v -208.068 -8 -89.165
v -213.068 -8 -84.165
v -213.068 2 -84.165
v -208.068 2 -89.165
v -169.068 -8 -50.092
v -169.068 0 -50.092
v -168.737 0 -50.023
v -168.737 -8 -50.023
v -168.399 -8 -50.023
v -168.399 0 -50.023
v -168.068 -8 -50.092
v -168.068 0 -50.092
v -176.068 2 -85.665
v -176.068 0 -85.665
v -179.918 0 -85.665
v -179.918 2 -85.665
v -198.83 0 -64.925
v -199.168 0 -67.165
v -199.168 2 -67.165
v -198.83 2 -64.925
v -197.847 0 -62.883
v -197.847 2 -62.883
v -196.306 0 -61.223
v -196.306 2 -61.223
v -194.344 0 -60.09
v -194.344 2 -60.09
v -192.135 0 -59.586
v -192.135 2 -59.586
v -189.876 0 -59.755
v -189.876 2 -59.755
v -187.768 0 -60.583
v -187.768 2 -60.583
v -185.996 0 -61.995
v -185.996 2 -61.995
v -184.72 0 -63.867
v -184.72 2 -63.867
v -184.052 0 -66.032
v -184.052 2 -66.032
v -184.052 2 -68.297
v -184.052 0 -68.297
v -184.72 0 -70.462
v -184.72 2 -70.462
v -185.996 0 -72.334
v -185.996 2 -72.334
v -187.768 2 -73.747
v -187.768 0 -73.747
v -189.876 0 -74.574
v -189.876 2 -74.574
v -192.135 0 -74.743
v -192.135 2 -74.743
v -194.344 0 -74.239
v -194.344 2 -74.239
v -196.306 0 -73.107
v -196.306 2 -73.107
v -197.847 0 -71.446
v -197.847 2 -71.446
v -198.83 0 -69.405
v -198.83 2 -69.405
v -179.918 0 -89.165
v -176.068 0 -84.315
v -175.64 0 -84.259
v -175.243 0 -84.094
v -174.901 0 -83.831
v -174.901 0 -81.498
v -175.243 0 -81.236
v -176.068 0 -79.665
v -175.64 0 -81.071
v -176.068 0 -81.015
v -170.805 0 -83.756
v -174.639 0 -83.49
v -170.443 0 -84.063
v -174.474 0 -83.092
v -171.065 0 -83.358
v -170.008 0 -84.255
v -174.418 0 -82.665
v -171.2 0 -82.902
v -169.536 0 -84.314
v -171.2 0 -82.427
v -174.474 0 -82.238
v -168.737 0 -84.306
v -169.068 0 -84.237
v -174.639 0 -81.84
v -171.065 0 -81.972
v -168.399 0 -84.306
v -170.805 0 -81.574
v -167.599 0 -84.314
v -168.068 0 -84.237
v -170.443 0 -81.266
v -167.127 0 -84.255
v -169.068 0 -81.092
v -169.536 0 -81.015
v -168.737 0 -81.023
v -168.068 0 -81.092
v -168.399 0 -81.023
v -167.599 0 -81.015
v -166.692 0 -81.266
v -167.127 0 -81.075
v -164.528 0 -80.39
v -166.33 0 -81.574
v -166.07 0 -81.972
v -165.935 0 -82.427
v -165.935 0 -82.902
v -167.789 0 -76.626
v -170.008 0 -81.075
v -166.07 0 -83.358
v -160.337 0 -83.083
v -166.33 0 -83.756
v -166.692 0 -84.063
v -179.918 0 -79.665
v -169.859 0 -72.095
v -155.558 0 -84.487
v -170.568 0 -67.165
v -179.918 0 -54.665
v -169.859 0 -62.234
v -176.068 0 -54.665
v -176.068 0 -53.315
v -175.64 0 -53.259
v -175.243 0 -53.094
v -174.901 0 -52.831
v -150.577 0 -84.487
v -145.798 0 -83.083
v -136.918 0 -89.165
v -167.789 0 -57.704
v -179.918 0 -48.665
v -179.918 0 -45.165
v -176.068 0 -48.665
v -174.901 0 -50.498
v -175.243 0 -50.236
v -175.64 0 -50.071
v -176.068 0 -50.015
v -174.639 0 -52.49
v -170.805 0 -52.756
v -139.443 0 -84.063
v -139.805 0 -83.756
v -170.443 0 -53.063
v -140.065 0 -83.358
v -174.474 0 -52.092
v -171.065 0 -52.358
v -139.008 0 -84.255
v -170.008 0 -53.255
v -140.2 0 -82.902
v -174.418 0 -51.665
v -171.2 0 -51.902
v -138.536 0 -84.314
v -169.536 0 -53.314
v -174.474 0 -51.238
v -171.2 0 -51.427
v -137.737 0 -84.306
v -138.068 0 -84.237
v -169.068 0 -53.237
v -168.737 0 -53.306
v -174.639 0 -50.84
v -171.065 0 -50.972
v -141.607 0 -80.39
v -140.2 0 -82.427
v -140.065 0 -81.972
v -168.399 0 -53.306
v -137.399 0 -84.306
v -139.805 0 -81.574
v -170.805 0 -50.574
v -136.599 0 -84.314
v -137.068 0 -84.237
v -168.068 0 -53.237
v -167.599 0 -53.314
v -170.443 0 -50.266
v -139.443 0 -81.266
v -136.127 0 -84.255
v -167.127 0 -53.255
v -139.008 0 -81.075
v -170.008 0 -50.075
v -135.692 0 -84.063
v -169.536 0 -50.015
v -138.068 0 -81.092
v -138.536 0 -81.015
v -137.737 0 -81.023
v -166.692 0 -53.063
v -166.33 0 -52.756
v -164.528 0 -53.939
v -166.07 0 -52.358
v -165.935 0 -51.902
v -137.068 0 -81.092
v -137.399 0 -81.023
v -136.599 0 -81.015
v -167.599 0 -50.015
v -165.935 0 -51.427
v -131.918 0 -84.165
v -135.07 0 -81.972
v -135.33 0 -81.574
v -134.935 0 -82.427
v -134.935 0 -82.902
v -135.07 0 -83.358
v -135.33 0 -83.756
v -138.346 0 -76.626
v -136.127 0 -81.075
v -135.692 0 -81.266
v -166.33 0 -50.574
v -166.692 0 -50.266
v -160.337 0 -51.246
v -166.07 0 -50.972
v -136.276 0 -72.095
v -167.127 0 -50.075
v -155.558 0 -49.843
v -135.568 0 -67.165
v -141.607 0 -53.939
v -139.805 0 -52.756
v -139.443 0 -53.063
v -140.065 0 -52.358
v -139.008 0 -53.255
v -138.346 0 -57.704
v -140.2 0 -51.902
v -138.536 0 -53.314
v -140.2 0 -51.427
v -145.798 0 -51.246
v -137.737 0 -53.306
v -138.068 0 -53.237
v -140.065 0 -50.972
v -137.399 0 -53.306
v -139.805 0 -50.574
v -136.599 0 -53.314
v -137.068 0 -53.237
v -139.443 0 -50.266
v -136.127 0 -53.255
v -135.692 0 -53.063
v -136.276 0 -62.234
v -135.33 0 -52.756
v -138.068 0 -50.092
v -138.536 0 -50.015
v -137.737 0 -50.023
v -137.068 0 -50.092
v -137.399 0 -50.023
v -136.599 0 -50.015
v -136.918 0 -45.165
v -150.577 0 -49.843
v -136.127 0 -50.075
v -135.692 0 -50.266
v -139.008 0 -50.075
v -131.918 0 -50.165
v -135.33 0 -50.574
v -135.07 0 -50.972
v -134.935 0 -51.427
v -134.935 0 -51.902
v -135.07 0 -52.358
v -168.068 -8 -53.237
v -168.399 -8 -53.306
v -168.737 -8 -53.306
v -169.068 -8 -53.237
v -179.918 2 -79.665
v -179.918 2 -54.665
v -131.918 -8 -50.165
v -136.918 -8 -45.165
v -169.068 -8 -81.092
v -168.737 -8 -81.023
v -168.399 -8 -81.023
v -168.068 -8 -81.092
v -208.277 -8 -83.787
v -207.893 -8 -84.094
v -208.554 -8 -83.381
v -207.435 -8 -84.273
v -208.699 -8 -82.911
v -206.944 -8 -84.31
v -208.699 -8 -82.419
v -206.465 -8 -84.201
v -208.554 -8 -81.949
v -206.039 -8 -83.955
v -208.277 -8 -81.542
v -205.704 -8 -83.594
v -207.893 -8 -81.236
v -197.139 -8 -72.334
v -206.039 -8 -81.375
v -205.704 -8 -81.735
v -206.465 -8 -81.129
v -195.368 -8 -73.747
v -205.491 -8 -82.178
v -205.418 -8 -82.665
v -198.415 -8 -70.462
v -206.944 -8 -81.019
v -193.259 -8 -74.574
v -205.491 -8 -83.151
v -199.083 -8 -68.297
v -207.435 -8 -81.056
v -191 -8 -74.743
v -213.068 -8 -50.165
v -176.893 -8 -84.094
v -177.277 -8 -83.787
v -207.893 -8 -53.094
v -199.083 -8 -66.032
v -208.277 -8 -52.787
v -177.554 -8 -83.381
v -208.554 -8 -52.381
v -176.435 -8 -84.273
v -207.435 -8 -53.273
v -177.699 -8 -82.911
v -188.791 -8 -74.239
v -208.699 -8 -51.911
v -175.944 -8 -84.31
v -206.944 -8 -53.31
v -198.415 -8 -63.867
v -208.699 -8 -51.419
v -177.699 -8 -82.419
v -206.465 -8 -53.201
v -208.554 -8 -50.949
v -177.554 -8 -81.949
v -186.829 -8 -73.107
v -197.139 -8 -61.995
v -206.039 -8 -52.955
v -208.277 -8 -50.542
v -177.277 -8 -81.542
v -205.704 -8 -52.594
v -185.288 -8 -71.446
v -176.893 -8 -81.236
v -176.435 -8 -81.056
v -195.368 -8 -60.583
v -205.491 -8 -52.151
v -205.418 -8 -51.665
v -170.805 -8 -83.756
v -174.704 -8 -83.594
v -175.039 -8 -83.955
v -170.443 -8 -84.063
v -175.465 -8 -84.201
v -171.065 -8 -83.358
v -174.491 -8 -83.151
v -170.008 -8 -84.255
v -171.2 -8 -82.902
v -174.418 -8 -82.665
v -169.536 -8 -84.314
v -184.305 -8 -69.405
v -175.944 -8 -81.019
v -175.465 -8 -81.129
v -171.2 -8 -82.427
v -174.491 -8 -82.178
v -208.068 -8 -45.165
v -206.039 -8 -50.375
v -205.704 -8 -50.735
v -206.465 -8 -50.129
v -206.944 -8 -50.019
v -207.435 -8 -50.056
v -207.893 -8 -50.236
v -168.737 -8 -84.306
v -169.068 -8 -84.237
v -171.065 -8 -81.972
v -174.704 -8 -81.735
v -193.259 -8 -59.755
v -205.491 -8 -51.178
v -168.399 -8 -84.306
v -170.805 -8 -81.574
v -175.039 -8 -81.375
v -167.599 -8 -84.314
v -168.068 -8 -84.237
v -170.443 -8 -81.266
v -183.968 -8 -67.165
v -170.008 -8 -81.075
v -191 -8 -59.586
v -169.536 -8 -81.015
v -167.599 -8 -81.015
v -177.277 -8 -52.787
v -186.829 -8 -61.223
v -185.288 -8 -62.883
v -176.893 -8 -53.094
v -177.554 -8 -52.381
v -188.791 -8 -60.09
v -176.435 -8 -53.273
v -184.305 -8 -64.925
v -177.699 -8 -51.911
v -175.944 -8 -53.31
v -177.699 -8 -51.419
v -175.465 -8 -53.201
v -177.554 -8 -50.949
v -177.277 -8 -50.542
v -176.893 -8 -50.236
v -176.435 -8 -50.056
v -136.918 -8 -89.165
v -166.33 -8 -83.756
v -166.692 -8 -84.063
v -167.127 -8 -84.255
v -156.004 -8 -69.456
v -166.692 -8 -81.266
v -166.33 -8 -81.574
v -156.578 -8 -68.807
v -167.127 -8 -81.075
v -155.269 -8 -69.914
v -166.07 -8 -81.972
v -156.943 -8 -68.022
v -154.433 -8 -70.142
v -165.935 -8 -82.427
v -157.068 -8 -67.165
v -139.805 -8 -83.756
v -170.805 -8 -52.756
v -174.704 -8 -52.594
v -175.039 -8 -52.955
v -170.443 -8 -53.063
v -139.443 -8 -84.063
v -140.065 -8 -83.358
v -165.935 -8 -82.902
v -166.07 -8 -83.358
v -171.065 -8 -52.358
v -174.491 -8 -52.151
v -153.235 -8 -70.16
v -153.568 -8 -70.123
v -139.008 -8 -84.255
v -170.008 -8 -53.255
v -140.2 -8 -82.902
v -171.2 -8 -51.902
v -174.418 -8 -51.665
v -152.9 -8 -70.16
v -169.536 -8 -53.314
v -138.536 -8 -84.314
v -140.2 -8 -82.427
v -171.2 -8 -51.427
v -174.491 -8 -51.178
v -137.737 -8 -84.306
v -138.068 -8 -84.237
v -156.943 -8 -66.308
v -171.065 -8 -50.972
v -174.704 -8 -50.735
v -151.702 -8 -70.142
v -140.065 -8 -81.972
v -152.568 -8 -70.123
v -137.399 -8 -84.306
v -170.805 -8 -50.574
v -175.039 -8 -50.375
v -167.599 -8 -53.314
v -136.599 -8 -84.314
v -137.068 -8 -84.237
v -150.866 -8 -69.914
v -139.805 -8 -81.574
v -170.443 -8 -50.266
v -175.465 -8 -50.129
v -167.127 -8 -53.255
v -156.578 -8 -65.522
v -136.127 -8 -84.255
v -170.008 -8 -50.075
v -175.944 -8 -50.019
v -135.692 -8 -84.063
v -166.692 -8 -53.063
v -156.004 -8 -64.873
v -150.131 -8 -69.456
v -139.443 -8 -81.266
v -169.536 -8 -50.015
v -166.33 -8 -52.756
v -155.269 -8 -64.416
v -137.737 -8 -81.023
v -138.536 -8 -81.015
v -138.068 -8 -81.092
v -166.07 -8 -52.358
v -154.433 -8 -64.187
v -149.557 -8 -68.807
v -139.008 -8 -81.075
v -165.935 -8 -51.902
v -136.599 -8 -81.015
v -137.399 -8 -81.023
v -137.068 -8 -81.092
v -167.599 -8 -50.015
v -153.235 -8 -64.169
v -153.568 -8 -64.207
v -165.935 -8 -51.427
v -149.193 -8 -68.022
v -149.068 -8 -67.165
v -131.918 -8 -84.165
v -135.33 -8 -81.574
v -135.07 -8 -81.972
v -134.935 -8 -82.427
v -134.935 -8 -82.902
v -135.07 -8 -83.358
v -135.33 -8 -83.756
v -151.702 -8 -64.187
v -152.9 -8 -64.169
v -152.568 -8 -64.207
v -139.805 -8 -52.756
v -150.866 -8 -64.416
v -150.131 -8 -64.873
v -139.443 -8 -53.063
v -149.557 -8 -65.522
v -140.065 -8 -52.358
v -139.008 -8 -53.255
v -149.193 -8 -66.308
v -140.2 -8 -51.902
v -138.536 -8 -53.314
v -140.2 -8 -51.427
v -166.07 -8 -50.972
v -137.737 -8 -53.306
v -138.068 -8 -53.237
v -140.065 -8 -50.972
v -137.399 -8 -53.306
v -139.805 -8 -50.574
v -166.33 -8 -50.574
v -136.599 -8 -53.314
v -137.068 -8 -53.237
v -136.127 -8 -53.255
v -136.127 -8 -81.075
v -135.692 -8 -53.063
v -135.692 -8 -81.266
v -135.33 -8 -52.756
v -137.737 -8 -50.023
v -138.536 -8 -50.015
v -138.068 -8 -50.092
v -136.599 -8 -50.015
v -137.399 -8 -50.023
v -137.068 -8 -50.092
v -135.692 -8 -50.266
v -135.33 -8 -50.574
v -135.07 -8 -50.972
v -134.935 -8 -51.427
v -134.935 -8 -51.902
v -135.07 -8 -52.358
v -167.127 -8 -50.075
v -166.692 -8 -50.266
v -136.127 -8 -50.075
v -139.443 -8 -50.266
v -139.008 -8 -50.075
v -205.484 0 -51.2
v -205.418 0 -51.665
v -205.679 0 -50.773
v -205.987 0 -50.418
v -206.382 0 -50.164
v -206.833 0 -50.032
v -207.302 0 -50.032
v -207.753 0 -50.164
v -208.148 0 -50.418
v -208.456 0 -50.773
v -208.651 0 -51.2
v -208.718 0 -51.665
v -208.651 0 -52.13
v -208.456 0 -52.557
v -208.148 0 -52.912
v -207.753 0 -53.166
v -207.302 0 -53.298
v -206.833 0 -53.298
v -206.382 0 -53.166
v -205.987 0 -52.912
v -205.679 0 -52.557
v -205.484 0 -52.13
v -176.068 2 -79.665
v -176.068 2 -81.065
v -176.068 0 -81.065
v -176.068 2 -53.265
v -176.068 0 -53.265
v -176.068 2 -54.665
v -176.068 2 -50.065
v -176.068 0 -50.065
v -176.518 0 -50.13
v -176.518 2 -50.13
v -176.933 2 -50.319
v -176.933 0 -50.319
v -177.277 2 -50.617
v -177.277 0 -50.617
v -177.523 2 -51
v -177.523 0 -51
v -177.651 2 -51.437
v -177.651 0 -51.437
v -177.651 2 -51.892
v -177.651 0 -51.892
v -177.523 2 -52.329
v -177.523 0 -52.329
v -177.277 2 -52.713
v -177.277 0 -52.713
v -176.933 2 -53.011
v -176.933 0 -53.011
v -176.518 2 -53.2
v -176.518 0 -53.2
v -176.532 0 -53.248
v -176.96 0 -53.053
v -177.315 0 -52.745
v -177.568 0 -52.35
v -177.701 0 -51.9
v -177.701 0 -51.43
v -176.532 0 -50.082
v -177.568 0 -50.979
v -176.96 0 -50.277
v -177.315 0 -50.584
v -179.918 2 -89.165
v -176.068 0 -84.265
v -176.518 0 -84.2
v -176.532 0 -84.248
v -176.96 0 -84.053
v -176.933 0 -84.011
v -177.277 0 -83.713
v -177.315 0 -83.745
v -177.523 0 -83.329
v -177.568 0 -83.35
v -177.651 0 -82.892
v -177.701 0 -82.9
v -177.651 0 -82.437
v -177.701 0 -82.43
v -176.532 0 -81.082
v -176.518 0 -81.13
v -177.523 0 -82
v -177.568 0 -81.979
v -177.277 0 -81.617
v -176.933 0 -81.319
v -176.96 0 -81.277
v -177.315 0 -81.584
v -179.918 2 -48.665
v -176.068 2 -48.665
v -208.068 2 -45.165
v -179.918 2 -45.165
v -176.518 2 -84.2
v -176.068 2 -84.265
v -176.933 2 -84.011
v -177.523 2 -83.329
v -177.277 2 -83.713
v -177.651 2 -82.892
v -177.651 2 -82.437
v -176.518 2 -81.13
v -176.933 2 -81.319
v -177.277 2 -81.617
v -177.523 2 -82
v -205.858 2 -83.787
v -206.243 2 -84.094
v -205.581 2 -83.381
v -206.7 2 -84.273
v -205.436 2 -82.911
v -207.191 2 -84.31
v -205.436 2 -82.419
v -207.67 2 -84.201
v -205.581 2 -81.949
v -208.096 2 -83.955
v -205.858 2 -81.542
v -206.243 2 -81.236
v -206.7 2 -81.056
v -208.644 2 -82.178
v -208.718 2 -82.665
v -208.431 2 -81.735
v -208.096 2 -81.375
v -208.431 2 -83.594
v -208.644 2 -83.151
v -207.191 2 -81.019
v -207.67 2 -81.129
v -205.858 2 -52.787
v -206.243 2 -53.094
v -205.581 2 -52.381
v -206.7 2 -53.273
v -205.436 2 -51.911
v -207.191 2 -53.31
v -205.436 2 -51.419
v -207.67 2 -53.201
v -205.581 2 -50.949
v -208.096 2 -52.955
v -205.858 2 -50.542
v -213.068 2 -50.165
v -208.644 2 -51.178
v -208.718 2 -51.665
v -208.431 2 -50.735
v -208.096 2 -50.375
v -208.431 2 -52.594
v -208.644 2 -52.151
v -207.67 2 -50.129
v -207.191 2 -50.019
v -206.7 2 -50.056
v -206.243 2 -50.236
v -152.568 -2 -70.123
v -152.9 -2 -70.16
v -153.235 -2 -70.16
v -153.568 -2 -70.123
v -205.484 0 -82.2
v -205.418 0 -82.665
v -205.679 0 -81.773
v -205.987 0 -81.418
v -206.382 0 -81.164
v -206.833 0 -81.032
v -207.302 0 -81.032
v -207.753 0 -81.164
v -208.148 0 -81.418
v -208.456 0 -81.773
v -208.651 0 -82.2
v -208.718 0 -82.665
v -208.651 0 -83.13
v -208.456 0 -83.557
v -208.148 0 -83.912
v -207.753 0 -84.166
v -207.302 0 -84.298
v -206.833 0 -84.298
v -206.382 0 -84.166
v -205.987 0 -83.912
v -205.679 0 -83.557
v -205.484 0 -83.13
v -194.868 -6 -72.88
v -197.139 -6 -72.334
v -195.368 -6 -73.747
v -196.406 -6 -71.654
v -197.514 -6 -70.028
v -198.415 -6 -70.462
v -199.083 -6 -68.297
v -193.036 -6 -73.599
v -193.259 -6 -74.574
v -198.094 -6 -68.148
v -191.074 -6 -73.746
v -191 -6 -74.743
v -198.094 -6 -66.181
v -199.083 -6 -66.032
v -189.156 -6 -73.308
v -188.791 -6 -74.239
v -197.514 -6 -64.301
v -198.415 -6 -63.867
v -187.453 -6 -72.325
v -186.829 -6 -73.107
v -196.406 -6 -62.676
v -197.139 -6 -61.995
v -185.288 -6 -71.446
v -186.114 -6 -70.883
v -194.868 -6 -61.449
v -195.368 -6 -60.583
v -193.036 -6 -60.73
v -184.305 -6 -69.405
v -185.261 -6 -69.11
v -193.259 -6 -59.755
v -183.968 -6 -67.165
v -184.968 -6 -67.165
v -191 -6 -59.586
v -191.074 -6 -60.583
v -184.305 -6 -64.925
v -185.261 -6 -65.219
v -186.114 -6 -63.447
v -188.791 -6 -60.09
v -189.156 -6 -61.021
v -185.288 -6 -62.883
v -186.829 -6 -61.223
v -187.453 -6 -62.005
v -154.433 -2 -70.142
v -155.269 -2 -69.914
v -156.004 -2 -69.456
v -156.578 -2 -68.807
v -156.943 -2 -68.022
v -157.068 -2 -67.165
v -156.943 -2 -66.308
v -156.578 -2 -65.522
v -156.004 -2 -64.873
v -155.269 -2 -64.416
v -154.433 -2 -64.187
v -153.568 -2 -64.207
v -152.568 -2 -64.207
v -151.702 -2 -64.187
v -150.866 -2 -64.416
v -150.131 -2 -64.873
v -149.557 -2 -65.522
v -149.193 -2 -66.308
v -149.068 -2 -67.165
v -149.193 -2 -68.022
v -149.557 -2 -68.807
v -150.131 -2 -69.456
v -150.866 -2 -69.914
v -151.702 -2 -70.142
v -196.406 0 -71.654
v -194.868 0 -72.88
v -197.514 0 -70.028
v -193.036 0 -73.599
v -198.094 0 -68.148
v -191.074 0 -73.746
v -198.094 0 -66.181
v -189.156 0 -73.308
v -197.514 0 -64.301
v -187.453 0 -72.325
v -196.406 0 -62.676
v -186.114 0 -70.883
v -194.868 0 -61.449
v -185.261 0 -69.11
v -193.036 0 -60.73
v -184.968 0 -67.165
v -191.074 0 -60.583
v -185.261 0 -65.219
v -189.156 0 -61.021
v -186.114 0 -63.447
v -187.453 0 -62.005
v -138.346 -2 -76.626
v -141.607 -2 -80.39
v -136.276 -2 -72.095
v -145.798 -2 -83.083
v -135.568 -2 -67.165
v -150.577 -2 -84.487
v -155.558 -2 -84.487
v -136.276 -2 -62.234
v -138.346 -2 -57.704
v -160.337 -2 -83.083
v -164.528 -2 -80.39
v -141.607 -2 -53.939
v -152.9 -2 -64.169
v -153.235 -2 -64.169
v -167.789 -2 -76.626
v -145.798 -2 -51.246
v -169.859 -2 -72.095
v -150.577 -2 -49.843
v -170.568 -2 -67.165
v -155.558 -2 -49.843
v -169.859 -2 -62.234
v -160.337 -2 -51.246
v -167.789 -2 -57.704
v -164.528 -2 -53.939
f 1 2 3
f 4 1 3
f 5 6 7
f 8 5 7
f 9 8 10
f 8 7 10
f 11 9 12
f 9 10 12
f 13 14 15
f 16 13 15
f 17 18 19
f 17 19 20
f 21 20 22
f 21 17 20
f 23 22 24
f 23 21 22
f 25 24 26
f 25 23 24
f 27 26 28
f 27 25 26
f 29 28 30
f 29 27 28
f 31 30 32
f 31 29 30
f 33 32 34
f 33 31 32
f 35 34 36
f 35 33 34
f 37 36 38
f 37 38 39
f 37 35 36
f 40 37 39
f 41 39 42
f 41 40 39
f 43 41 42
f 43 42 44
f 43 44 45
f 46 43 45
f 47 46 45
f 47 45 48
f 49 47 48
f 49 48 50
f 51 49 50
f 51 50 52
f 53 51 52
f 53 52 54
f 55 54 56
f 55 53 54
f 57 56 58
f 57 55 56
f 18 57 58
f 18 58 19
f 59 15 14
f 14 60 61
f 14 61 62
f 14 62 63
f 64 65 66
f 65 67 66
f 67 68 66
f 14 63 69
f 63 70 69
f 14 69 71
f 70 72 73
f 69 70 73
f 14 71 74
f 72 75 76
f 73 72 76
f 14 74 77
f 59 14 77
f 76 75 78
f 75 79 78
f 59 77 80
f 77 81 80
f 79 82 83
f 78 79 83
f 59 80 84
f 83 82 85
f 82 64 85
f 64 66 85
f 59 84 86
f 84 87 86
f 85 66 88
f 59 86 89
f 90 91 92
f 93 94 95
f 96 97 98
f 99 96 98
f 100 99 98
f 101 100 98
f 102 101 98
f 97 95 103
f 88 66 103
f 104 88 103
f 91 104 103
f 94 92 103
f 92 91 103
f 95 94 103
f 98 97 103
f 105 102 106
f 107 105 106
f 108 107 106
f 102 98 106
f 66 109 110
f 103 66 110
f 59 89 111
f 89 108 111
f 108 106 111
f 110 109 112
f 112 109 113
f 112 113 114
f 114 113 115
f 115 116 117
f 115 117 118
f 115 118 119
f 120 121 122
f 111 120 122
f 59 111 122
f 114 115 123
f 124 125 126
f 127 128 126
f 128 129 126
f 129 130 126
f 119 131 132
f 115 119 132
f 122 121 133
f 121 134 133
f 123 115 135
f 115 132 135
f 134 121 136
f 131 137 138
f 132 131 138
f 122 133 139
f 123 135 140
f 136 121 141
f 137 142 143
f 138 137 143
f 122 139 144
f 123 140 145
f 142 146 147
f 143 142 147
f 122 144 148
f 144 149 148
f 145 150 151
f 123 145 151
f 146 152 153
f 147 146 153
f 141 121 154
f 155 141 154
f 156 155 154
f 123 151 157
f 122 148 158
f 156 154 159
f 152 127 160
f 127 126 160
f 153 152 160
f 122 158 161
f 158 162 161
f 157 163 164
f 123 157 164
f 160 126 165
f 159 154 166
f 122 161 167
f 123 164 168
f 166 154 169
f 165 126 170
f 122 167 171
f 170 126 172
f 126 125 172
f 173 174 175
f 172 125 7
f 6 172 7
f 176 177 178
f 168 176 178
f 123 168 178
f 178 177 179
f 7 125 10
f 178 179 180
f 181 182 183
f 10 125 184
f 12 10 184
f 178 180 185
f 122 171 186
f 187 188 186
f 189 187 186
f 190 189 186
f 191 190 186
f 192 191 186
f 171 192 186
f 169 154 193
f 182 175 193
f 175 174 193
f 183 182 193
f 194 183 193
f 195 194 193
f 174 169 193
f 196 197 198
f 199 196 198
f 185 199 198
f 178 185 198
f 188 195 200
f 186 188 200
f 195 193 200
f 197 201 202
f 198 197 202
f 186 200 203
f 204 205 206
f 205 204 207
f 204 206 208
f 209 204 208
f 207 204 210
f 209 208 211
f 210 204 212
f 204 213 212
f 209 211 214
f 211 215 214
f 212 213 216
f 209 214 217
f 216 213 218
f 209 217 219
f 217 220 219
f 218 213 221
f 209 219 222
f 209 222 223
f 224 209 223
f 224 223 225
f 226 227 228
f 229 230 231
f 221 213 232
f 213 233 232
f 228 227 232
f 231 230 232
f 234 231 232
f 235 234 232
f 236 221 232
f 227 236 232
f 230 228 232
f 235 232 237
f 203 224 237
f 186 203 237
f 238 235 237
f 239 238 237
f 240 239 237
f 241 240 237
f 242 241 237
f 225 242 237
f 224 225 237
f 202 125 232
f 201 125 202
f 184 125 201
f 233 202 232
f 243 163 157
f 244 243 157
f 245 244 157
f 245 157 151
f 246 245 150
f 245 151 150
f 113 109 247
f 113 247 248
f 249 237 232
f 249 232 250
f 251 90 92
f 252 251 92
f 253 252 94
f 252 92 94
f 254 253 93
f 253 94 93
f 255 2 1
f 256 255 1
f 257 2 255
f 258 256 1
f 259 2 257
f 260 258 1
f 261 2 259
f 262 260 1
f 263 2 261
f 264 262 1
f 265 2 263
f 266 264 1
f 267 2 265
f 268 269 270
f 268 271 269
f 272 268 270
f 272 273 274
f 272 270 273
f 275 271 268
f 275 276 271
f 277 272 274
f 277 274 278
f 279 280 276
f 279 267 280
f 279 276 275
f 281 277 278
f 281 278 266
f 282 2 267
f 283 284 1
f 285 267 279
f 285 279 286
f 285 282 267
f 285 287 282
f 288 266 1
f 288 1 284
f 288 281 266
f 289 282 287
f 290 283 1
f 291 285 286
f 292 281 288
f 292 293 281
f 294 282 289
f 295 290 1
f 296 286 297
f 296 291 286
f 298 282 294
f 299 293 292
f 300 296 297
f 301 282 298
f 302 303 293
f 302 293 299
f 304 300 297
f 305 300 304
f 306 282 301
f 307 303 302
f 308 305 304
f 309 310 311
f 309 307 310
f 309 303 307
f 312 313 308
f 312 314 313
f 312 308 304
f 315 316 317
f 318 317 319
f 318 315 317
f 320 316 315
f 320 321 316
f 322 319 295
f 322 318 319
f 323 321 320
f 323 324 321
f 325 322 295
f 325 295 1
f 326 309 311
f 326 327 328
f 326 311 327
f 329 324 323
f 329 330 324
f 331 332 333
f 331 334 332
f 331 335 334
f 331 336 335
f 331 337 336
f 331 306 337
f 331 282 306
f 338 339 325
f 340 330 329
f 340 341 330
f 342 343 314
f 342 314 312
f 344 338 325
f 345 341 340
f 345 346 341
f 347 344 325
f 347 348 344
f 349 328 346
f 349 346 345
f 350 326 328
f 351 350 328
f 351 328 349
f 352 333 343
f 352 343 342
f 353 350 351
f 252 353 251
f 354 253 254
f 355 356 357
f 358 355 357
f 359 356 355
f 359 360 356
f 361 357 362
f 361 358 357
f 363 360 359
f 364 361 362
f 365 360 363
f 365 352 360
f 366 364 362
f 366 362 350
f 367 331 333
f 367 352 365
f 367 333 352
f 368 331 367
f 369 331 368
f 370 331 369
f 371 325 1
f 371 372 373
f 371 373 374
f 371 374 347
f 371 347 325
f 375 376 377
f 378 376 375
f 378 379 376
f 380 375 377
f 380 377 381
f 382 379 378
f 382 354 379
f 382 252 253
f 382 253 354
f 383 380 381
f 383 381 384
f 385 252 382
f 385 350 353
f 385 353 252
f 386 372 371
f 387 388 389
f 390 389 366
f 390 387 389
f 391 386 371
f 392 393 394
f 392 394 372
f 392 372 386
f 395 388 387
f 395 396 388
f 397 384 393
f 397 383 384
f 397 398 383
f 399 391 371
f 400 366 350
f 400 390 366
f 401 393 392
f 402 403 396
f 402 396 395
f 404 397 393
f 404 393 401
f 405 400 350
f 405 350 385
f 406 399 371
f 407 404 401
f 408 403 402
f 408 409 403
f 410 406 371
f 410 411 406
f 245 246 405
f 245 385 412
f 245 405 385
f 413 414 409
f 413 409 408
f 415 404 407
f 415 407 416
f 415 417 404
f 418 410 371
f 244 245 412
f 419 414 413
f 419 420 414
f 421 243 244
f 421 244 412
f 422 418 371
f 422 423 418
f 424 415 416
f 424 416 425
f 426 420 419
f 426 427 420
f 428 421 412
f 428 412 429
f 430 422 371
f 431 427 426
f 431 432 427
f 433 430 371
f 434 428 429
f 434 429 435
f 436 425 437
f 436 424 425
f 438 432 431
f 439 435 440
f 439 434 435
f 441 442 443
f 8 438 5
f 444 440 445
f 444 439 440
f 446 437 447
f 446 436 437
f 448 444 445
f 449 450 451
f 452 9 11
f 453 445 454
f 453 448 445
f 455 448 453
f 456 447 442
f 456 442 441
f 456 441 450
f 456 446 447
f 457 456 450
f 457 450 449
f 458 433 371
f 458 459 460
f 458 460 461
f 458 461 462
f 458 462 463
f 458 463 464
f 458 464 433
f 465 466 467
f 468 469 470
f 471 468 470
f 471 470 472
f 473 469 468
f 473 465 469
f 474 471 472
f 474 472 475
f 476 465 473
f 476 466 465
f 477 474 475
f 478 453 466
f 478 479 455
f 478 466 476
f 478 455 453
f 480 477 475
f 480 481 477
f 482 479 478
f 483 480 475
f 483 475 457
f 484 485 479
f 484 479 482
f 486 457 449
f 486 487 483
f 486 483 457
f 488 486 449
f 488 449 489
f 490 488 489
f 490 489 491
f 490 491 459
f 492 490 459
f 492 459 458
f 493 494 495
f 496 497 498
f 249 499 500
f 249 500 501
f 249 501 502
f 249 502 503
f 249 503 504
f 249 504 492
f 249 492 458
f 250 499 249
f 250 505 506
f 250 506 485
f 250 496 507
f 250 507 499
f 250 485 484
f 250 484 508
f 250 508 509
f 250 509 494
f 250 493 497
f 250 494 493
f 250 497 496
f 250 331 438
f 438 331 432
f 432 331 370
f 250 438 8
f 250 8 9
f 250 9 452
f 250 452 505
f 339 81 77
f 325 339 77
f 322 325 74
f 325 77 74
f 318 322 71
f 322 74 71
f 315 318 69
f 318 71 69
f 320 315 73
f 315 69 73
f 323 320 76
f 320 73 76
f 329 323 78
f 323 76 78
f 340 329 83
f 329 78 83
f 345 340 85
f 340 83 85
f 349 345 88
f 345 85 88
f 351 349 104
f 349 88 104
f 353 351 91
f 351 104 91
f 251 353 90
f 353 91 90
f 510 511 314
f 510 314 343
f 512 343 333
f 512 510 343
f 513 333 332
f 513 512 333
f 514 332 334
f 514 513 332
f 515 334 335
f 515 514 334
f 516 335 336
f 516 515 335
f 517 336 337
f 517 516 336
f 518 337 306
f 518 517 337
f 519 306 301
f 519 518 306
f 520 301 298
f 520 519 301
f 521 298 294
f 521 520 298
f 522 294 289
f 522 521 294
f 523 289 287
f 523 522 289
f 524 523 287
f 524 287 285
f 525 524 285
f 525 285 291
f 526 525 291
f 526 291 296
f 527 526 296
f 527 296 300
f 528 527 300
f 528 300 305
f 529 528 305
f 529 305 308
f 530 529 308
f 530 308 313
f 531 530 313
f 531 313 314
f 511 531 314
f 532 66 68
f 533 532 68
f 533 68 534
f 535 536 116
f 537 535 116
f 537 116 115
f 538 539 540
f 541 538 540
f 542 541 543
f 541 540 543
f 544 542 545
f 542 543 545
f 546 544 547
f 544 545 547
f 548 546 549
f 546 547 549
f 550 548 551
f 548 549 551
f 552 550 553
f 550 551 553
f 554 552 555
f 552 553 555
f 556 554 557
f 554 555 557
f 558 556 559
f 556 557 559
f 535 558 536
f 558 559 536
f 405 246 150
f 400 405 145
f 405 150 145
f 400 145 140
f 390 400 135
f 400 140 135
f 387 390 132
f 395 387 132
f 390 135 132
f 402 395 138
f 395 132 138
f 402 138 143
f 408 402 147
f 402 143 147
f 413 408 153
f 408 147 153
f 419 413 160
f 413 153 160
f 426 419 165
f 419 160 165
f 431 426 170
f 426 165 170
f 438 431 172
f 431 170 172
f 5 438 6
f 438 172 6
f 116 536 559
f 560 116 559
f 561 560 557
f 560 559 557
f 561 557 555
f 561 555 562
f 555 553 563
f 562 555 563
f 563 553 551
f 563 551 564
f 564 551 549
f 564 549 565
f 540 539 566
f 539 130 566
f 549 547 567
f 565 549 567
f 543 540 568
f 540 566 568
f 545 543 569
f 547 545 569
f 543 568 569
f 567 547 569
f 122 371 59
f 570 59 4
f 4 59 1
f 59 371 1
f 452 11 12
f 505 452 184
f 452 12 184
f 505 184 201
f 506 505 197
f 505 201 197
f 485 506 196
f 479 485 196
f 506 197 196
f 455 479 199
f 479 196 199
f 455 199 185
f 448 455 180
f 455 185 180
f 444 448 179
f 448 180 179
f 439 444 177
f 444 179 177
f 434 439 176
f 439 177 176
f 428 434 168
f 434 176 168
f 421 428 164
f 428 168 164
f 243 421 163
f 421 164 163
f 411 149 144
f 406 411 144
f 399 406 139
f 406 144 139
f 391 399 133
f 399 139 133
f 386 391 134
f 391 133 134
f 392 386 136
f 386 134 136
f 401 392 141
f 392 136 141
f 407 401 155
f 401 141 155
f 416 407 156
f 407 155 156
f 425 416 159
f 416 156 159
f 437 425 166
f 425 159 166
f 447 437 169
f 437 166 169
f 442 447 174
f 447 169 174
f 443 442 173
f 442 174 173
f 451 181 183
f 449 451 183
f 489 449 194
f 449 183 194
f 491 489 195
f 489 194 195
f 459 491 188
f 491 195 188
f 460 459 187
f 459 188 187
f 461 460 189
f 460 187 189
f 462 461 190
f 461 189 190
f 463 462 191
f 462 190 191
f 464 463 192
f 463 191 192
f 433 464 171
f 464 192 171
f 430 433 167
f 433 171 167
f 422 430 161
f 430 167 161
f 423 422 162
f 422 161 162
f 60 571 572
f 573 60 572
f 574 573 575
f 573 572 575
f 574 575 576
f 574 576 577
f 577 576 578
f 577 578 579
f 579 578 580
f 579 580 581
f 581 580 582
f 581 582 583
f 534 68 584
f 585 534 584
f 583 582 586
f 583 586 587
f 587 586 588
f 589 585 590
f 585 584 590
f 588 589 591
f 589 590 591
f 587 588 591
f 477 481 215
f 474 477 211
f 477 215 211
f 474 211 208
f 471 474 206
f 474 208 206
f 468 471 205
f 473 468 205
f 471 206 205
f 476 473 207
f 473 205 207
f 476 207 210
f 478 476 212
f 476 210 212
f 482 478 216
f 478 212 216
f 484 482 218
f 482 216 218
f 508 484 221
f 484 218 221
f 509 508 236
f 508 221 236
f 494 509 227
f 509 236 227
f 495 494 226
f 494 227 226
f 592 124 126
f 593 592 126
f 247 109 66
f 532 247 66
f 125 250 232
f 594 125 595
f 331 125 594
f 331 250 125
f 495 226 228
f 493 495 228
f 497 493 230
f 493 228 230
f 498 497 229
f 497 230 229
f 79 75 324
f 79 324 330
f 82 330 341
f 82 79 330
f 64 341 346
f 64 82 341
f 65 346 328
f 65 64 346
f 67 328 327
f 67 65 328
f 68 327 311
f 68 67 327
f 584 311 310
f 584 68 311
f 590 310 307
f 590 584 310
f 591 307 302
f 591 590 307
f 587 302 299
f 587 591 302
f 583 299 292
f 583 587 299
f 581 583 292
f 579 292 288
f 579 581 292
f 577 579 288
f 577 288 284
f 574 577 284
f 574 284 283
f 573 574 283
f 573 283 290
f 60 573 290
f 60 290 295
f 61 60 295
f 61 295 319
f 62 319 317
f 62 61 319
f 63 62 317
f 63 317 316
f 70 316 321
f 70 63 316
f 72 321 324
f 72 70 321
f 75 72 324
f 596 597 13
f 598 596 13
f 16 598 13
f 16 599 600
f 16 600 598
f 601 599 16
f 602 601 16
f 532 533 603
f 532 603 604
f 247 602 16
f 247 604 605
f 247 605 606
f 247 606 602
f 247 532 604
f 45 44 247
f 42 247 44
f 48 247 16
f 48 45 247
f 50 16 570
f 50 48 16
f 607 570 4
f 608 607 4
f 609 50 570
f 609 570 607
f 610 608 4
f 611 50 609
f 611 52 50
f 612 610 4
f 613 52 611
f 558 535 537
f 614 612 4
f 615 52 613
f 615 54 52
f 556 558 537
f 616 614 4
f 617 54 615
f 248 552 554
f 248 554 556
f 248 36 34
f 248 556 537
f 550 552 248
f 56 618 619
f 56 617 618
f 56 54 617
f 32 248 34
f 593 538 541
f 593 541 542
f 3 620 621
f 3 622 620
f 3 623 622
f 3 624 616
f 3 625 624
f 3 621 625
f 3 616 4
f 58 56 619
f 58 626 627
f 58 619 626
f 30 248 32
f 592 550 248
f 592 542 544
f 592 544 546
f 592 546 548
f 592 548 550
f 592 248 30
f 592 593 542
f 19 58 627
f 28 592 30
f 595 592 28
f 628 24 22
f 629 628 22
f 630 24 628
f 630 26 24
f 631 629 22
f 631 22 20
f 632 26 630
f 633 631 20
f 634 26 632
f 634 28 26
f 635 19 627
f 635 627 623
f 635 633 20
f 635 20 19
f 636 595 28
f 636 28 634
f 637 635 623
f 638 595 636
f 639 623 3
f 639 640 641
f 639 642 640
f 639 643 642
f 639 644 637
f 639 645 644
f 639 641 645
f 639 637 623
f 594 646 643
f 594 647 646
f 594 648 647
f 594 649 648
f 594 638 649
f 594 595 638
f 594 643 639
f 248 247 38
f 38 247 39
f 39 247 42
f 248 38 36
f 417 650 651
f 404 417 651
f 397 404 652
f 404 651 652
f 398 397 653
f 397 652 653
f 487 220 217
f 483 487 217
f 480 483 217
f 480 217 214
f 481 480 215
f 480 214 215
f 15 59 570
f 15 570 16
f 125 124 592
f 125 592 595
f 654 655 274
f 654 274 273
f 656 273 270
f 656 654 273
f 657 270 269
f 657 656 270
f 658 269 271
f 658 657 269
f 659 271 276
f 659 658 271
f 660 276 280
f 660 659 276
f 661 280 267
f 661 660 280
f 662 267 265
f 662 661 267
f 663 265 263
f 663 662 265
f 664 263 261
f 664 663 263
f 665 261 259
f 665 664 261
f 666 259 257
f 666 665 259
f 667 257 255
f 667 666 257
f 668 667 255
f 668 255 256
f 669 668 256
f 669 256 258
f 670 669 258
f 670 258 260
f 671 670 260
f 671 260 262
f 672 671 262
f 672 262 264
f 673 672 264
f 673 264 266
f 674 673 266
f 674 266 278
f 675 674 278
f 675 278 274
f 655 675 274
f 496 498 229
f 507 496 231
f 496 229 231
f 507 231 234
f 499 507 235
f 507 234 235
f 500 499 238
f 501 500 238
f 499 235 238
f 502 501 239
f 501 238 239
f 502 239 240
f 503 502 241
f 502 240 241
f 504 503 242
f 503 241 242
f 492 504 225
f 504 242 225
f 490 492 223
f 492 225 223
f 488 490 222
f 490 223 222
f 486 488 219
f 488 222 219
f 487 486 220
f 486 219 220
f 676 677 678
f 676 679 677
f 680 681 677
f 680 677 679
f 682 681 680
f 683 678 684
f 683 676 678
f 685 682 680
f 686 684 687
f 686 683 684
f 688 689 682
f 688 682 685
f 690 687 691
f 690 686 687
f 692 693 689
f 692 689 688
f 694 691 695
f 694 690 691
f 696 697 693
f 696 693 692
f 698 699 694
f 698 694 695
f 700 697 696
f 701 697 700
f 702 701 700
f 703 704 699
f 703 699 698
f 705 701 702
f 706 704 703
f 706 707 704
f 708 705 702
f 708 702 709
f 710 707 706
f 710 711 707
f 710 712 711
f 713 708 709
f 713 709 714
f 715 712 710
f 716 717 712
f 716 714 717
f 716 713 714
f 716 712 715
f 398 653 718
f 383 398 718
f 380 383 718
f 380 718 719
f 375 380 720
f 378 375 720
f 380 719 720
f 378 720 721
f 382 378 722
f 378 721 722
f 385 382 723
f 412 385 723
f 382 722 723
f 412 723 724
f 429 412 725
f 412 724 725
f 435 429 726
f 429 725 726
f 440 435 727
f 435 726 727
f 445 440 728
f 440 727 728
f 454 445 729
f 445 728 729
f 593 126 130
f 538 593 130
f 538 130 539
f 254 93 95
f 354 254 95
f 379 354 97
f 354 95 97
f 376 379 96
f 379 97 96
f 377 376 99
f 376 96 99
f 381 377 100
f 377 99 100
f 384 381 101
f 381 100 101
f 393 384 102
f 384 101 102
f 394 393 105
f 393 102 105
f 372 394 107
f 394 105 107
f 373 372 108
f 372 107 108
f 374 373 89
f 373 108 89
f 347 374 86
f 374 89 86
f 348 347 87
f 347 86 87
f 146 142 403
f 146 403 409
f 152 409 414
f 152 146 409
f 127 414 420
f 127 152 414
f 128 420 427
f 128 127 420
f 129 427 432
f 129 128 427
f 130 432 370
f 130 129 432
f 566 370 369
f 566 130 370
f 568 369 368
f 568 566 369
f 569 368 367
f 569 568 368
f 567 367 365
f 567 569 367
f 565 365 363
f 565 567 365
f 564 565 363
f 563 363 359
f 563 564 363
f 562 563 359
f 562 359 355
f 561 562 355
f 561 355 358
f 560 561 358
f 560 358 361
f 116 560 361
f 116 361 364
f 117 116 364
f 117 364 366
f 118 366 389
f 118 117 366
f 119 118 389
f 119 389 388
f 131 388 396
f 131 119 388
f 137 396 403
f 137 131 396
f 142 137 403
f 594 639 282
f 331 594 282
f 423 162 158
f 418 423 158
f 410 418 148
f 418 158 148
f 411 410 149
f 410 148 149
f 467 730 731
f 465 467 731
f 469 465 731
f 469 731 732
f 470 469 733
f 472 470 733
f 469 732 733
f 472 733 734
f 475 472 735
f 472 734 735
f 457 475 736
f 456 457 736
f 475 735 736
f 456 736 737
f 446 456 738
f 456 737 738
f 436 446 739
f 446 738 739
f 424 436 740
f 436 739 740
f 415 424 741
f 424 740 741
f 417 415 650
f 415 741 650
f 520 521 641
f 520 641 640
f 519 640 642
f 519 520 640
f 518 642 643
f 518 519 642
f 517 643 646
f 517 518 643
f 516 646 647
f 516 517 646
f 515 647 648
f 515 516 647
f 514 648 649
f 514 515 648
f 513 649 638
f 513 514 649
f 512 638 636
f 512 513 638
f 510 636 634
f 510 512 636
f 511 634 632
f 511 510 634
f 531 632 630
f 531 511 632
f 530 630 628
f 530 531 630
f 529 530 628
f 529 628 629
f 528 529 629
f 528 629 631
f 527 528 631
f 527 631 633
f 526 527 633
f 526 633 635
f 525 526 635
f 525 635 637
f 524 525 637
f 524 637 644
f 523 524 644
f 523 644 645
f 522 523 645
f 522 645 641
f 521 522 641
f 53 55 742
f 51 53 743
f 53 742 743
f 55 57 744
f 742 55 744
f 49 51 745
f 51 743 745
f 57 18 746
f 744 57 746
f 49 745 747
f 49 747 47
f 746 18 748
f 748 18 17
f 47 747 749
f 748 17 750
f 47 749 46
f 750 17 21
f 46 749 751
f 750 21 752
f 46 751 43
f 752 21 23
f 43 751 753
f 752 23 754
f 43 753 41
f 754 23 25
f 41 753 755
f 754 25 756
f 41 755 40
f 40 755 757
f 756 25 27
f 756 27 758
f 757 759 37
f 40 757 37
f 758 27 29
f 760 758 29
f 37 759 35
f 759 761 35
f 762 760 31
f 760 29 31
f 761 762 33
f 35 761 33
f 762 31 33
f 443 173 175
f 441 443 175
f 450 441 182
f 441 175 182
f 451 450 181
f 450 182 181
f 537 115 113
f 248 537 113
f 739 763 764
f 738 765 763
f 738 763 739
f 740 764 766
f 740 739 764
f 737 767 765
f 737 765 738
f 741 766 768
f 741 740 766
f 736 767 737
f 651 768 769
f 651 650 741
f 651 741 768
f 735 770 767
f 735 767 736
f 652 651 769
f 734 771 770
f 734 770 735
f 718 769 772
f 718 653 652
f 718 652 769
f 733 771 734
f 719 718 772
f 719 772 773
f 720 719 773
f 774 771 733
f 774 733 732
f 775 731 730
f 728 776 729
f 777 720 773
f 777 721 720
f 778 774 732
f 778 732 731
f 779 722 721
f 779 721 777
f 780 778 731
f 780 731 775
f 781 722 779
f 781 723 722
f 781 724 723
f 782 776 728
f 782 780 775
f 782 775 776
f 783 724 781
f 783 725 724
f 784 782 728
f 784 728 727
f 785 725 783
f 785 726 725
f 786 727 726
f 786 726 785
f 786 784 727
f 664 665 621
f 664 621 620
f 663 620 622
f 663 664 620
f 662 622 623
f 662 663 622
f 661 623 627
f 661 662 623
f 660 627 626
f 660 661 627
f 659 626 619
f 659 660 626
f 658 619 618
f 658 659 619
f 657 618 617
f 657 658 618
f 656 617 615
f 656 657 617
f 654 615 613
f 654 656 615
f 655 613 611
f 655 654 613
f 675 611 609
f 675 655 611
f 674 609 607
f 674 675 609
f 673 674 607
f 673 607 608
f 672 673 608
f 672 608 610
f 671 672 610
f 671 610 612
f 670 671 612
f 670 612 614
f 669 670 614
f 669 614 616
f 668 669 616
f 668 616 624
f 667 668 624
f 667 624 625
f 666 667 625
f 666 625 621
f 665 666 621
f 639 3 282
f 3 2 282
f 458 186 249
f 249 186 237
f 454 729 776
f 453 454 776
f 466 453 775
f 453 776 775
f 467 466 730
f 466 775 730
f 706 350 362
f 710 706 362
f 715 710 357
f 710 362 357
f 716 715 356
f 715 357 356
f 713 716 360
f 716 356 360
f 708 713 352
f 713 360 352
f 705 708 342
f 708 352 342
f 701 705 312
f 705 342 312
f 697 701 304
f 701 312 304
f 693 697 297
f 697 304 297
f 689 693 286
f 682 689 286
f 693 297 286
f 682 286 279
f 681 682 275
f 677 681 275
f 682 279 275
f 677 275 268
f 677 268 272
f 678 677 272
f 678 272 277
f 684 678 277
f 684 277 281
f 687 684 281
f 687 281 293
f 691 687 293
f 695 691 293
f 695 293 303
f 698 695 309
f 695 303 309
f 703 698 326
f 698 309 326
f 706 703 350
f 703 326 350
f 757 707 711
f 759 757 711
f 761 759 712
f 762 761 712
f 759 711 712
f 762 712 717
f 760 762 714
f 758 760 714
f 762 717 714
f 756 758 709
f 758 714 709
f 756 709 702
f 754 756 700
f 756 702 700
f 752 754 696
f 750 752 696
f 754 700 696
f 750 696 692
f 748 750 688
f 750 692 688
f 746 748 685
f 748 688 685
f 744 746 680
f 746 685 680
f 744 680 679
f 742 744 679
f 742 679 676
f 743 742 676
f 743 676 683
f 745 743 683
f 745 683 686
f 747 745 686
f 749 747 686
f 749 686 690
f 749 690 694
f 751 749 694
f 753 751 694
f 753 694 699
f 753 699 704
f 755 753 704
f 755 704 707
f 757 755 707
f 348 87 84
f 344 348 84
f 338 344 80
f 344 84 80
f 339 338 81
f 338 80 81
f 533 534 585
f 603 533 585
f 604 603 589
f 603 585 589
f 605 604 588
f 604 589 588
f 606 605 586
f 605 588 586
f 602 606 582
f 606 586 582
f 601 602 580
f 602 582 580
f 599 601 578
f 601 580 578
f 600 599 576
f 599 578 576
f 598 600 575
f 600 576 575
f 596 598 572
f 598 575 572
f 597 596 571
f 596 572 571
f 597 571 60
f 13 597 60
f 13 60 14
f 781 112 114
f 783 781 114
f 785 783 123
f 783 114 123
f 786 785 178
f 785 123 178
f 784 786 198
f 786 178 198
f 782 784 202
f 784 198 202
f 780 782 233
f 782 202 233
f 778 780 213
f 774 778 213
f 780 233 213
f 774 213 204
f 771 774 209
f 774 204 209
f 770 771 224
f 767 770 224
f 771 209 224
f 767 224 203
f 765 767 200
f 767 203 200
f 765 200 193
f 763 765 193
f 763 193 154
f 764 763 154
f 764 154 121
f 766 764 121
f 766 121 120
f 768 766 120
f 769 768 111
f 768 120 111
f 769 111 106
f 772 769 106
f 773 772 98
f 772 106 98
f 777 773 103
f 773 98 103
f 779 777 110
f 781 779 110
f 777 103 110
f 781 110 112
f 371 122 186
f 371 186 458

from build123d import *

# Parameters (mm, degrees)
F0_W      = 81.15
F0_H      = 44
F0_R      = 1.65
F0_R_2    = 3
F1_DEPTH  = 8
F2_R      = 17.5
F3_DEPTH  = 2
F4_W      = 33.15
F4_H      = 44
F4_R      = 1.65
F4_R_2    = 7.6
F5_DEPTH  = 2
F6_R      = 6.5
F7_DEPTH  = 3
F8_R      = 7.6
F9_DEPTH  = 2
F10_R     = 6.6
F11_DEPTH = 10
F13_DEPTH = 2
F14_SIZE  = 5


with BuildPart() as f1:
    # F0 (on Front) → F1 (new body)
    with BuildSketch(Plane.XZ):
        with Locations((-172.492545, -67.164728)):
            Rectangle(F0_W, F0_H)
        with Locations((-207.067545, -82.664728)):
            Circle(F0_R, mode=Mode.SUBTRACT)
        with Locations((-176.067545, -82.664728)):
            Circle(F0_R, mode=Mode.SUBTRACT)
        with Locations((-191.567545, -67.164728)):
            Circle(F0_R_2, mode=Mode.SUBTRACT)
        with BuildLine():
            ThreePointArc((-168.067545, -84.237147), (-168.567545, -84.314728), (-169.067545, -84.237147))
            ThreePointArc((-169.067545, -84.237147), (-171.217545, -82.664728), (-169.067545, -81.09231))
            ThreePointArc((-169.067545, -81.09231), (-168.567545, -81.014728), (-168.067545, -81.09231))
            ThreePointArc((-168.067545, -81.09231), (-165.917545, -82.664728), (-168.067545, -84.237147))
        make_face(mode=Mode.SUBTRACT)
        with BuildLine():
            ThreePointArc((-137.067545, -84.237147), (-137.567545, -84.314728), (-138.067545, -84.237147))
            ThreePointArc((-138.067545, -84.237147), (-140.217545, -82.664728), (-138.067545, -81.09231))
            ThreePointArc((-138.067545, -81.09231), (-137.567545, -81.014728), (-137.067545, -81.09231))
            ThreePointArc((-137.067545, -81.09231), (-134.917545, -82.664728), (-137.067545, -84.237147))
        make_face(mode=Mode.SUBTRACT)
        with BuildLine():
            ThreePointArc((-152.567545, -70.122768), (-153.067545, -70.164728), (-153.567545, -70.122768))
            ThreePointArc((-153.567545, -70.122768), (-157.067545, -67.164728), (-153.567545, -64.206688))
            ThreePointArc((-153.567545, -64.206688), (-153.067545, -64.164728), (-152.567545, -64.206688))
            ThreePointArc((-152.567545, -64.206688), (-149.067545, -67.164728), (-152.567545, -70.122768))
        make_face(mode=Mode.SUBTRACT)
        with Locations((-207.067545, -51.664728)):
            Circle(F0_R, mode=Mode.SUBTRACT)
        with Locations((-176.067545, -51.664728)):
            Circle(F0_R, mode=Mode.SUBTRACT)
        with BuildLine():
            ThreePointArc((-168.067545, -53.237147), (-168.567545, -53.314728), (-169.067545, -53.237147))
            ThreePointArc((-169.067545, -53.237147), (-171.217545, -51.664728), (-169.067545, -50.09231))
            ThreePointArc((-169.067545, -50.09231), (-168.567545, -50.014728), (-168.067545, -50.09231))
            ThreePointArc((-168.067545, -50.09231), (-165.917545, -51.664728), (-168.067545, -53.237147))
        make_face(mode=Mode.SUBTRACT)
        with BuildLine():
            ThreePointArc((-137.067545, -53.237147), (-137.567545, -53.314728), (-138.067545, -53.237147))
            ThreePointArc((-138.067545, -53.237147), (-140.217545, -51.664728), (-138.067545, -50.09231))
            ThreePointArc((-138.067545, -50.09231), (-137.567545, -50.014728), (-137.067545, -50.09231))
            ThreePointArc((-137.067545, -50.09231), (-134.917545, -51.664728), (-137.067545, -53.237147))
        make_face(mode=Mode.SUBTRACT)
    extrude(amount=F1_DEPTH)

    # F2 (on face) → F3 (cut)
    with BuildSketch(Plane(origin=(0, 0, 0), x_dir=(-1, 0, 0), z_dir=(0, 1, 0))):
        with Locations((153.067545, -67.164728)):
            Circle(F2_R)
    extrude(amount=-F3_DEPTH, mode=Mode.SUBTRACT)

    # F4 (on face) → F5 (join)
    with BuildSketch(Plane(origin=(0, 0, 0), x_dir=(-1, 0, 0), z_dir=(0, 1, 0))):
        with Locations((196.492545, -67.164728)):
            Rectangle(F4_W, F4_H)
        with Locations((207.067545, -82.664728)):
            Circle(F4_R, mode=Mode.SUBTRACT)
        with Locations((191.567545, -67.164728)):
            Circle(F4_R_2, mode=Mode.SUBTRACT)
        with Locations((207.067545, -51.664728)):
            Circle(F4_R, mode=Mode.SUBTRACT)
    extrude(amount=F5_DEPTH)

    # F6 (on face) → F7 (cut)
    with BuildSketch(Plane(origin=(0, 2, 0), x_dir=(-1, 0, 0), z_dir=(0, 1, 0))):
        with Locations((191.567545, -67.164728)):
            Circle(F6_R)
    extrude(amount=-F7_DEPTH, mode=Mode.SUBTRACT)

    # F8 (on face) → F9 (cut)
    with BuildSketch(Plane.XZ.offset(8)):
        with Locations((-191.567545, -67.164728)):
            Circle(F8_R)
    extrude(amount=-F9_DEPTH, mode=Mode.SUBTRACT)

    # F10 (on face) → F11 (cut)
    with BuildSketch(Plane.XZ.offset(8)):
        with Locations((-191.567545, -67.164728)):
            Circle(F10_R)
    extrude(amount=-F11_DEPTH, mode=Mode.SUBTRACT)

    # F12 (on face) → F13 (join)
    with BuildSketch(Plane(origin=(0, 0, 0), x_dir=(-1, 0, 0), z_dir=(0, 1, 0))):
        with BuildLine():
            ThreePointArc((176.067545, -81.064728), (177.667545, -82.664728), (176.067545, -84.264728))
            Line((176.067545, -84.264728), (176.067545, -85.664728))
            Line((176.067545, -85.664728), (179.917545, -85.664728))
            Line((179.917545, -85.664728), (179.917545, -79.664728))
            Line((179.917545, -79.664728), (176.067545, -79.664728))
            Line((176.067545, -79.664728), (176.067545, -81.064728))
        make_face()
        with BuildLine():
            Line((176.067545, -53.264728), (176.067545, -54.664728))
            Line((176.067545, -54.664728), (179.917545, -54.664728))
            Line((179.917545, -54.664728), (179.917545, -48.664728))
            Line((179.917545, -48.664728), (176.067545, -48.664728))
            Line((176.067545, -48.664728), (176.067545, -50.064728))
            ThreePointArc((176.067545, -50.064728), (177.667545, -51.664728), (176.067545, -53.264728))
        make_face()
    extrude(amount=F13_DEPTH)

    # F14
    f14_edges = [f1.edges().sort_by_distance(p)[0] for p in [
        (-213.067545, -3, -89.164728),
        (-213.067545, -3, -45.164728),
        (-131.917545, -4, -89.164728),
        (-131.917545, -4, -45.164728),
    ]]
    chamfer(f14_edges, length=F14_SIZE)


solid = f1.part
